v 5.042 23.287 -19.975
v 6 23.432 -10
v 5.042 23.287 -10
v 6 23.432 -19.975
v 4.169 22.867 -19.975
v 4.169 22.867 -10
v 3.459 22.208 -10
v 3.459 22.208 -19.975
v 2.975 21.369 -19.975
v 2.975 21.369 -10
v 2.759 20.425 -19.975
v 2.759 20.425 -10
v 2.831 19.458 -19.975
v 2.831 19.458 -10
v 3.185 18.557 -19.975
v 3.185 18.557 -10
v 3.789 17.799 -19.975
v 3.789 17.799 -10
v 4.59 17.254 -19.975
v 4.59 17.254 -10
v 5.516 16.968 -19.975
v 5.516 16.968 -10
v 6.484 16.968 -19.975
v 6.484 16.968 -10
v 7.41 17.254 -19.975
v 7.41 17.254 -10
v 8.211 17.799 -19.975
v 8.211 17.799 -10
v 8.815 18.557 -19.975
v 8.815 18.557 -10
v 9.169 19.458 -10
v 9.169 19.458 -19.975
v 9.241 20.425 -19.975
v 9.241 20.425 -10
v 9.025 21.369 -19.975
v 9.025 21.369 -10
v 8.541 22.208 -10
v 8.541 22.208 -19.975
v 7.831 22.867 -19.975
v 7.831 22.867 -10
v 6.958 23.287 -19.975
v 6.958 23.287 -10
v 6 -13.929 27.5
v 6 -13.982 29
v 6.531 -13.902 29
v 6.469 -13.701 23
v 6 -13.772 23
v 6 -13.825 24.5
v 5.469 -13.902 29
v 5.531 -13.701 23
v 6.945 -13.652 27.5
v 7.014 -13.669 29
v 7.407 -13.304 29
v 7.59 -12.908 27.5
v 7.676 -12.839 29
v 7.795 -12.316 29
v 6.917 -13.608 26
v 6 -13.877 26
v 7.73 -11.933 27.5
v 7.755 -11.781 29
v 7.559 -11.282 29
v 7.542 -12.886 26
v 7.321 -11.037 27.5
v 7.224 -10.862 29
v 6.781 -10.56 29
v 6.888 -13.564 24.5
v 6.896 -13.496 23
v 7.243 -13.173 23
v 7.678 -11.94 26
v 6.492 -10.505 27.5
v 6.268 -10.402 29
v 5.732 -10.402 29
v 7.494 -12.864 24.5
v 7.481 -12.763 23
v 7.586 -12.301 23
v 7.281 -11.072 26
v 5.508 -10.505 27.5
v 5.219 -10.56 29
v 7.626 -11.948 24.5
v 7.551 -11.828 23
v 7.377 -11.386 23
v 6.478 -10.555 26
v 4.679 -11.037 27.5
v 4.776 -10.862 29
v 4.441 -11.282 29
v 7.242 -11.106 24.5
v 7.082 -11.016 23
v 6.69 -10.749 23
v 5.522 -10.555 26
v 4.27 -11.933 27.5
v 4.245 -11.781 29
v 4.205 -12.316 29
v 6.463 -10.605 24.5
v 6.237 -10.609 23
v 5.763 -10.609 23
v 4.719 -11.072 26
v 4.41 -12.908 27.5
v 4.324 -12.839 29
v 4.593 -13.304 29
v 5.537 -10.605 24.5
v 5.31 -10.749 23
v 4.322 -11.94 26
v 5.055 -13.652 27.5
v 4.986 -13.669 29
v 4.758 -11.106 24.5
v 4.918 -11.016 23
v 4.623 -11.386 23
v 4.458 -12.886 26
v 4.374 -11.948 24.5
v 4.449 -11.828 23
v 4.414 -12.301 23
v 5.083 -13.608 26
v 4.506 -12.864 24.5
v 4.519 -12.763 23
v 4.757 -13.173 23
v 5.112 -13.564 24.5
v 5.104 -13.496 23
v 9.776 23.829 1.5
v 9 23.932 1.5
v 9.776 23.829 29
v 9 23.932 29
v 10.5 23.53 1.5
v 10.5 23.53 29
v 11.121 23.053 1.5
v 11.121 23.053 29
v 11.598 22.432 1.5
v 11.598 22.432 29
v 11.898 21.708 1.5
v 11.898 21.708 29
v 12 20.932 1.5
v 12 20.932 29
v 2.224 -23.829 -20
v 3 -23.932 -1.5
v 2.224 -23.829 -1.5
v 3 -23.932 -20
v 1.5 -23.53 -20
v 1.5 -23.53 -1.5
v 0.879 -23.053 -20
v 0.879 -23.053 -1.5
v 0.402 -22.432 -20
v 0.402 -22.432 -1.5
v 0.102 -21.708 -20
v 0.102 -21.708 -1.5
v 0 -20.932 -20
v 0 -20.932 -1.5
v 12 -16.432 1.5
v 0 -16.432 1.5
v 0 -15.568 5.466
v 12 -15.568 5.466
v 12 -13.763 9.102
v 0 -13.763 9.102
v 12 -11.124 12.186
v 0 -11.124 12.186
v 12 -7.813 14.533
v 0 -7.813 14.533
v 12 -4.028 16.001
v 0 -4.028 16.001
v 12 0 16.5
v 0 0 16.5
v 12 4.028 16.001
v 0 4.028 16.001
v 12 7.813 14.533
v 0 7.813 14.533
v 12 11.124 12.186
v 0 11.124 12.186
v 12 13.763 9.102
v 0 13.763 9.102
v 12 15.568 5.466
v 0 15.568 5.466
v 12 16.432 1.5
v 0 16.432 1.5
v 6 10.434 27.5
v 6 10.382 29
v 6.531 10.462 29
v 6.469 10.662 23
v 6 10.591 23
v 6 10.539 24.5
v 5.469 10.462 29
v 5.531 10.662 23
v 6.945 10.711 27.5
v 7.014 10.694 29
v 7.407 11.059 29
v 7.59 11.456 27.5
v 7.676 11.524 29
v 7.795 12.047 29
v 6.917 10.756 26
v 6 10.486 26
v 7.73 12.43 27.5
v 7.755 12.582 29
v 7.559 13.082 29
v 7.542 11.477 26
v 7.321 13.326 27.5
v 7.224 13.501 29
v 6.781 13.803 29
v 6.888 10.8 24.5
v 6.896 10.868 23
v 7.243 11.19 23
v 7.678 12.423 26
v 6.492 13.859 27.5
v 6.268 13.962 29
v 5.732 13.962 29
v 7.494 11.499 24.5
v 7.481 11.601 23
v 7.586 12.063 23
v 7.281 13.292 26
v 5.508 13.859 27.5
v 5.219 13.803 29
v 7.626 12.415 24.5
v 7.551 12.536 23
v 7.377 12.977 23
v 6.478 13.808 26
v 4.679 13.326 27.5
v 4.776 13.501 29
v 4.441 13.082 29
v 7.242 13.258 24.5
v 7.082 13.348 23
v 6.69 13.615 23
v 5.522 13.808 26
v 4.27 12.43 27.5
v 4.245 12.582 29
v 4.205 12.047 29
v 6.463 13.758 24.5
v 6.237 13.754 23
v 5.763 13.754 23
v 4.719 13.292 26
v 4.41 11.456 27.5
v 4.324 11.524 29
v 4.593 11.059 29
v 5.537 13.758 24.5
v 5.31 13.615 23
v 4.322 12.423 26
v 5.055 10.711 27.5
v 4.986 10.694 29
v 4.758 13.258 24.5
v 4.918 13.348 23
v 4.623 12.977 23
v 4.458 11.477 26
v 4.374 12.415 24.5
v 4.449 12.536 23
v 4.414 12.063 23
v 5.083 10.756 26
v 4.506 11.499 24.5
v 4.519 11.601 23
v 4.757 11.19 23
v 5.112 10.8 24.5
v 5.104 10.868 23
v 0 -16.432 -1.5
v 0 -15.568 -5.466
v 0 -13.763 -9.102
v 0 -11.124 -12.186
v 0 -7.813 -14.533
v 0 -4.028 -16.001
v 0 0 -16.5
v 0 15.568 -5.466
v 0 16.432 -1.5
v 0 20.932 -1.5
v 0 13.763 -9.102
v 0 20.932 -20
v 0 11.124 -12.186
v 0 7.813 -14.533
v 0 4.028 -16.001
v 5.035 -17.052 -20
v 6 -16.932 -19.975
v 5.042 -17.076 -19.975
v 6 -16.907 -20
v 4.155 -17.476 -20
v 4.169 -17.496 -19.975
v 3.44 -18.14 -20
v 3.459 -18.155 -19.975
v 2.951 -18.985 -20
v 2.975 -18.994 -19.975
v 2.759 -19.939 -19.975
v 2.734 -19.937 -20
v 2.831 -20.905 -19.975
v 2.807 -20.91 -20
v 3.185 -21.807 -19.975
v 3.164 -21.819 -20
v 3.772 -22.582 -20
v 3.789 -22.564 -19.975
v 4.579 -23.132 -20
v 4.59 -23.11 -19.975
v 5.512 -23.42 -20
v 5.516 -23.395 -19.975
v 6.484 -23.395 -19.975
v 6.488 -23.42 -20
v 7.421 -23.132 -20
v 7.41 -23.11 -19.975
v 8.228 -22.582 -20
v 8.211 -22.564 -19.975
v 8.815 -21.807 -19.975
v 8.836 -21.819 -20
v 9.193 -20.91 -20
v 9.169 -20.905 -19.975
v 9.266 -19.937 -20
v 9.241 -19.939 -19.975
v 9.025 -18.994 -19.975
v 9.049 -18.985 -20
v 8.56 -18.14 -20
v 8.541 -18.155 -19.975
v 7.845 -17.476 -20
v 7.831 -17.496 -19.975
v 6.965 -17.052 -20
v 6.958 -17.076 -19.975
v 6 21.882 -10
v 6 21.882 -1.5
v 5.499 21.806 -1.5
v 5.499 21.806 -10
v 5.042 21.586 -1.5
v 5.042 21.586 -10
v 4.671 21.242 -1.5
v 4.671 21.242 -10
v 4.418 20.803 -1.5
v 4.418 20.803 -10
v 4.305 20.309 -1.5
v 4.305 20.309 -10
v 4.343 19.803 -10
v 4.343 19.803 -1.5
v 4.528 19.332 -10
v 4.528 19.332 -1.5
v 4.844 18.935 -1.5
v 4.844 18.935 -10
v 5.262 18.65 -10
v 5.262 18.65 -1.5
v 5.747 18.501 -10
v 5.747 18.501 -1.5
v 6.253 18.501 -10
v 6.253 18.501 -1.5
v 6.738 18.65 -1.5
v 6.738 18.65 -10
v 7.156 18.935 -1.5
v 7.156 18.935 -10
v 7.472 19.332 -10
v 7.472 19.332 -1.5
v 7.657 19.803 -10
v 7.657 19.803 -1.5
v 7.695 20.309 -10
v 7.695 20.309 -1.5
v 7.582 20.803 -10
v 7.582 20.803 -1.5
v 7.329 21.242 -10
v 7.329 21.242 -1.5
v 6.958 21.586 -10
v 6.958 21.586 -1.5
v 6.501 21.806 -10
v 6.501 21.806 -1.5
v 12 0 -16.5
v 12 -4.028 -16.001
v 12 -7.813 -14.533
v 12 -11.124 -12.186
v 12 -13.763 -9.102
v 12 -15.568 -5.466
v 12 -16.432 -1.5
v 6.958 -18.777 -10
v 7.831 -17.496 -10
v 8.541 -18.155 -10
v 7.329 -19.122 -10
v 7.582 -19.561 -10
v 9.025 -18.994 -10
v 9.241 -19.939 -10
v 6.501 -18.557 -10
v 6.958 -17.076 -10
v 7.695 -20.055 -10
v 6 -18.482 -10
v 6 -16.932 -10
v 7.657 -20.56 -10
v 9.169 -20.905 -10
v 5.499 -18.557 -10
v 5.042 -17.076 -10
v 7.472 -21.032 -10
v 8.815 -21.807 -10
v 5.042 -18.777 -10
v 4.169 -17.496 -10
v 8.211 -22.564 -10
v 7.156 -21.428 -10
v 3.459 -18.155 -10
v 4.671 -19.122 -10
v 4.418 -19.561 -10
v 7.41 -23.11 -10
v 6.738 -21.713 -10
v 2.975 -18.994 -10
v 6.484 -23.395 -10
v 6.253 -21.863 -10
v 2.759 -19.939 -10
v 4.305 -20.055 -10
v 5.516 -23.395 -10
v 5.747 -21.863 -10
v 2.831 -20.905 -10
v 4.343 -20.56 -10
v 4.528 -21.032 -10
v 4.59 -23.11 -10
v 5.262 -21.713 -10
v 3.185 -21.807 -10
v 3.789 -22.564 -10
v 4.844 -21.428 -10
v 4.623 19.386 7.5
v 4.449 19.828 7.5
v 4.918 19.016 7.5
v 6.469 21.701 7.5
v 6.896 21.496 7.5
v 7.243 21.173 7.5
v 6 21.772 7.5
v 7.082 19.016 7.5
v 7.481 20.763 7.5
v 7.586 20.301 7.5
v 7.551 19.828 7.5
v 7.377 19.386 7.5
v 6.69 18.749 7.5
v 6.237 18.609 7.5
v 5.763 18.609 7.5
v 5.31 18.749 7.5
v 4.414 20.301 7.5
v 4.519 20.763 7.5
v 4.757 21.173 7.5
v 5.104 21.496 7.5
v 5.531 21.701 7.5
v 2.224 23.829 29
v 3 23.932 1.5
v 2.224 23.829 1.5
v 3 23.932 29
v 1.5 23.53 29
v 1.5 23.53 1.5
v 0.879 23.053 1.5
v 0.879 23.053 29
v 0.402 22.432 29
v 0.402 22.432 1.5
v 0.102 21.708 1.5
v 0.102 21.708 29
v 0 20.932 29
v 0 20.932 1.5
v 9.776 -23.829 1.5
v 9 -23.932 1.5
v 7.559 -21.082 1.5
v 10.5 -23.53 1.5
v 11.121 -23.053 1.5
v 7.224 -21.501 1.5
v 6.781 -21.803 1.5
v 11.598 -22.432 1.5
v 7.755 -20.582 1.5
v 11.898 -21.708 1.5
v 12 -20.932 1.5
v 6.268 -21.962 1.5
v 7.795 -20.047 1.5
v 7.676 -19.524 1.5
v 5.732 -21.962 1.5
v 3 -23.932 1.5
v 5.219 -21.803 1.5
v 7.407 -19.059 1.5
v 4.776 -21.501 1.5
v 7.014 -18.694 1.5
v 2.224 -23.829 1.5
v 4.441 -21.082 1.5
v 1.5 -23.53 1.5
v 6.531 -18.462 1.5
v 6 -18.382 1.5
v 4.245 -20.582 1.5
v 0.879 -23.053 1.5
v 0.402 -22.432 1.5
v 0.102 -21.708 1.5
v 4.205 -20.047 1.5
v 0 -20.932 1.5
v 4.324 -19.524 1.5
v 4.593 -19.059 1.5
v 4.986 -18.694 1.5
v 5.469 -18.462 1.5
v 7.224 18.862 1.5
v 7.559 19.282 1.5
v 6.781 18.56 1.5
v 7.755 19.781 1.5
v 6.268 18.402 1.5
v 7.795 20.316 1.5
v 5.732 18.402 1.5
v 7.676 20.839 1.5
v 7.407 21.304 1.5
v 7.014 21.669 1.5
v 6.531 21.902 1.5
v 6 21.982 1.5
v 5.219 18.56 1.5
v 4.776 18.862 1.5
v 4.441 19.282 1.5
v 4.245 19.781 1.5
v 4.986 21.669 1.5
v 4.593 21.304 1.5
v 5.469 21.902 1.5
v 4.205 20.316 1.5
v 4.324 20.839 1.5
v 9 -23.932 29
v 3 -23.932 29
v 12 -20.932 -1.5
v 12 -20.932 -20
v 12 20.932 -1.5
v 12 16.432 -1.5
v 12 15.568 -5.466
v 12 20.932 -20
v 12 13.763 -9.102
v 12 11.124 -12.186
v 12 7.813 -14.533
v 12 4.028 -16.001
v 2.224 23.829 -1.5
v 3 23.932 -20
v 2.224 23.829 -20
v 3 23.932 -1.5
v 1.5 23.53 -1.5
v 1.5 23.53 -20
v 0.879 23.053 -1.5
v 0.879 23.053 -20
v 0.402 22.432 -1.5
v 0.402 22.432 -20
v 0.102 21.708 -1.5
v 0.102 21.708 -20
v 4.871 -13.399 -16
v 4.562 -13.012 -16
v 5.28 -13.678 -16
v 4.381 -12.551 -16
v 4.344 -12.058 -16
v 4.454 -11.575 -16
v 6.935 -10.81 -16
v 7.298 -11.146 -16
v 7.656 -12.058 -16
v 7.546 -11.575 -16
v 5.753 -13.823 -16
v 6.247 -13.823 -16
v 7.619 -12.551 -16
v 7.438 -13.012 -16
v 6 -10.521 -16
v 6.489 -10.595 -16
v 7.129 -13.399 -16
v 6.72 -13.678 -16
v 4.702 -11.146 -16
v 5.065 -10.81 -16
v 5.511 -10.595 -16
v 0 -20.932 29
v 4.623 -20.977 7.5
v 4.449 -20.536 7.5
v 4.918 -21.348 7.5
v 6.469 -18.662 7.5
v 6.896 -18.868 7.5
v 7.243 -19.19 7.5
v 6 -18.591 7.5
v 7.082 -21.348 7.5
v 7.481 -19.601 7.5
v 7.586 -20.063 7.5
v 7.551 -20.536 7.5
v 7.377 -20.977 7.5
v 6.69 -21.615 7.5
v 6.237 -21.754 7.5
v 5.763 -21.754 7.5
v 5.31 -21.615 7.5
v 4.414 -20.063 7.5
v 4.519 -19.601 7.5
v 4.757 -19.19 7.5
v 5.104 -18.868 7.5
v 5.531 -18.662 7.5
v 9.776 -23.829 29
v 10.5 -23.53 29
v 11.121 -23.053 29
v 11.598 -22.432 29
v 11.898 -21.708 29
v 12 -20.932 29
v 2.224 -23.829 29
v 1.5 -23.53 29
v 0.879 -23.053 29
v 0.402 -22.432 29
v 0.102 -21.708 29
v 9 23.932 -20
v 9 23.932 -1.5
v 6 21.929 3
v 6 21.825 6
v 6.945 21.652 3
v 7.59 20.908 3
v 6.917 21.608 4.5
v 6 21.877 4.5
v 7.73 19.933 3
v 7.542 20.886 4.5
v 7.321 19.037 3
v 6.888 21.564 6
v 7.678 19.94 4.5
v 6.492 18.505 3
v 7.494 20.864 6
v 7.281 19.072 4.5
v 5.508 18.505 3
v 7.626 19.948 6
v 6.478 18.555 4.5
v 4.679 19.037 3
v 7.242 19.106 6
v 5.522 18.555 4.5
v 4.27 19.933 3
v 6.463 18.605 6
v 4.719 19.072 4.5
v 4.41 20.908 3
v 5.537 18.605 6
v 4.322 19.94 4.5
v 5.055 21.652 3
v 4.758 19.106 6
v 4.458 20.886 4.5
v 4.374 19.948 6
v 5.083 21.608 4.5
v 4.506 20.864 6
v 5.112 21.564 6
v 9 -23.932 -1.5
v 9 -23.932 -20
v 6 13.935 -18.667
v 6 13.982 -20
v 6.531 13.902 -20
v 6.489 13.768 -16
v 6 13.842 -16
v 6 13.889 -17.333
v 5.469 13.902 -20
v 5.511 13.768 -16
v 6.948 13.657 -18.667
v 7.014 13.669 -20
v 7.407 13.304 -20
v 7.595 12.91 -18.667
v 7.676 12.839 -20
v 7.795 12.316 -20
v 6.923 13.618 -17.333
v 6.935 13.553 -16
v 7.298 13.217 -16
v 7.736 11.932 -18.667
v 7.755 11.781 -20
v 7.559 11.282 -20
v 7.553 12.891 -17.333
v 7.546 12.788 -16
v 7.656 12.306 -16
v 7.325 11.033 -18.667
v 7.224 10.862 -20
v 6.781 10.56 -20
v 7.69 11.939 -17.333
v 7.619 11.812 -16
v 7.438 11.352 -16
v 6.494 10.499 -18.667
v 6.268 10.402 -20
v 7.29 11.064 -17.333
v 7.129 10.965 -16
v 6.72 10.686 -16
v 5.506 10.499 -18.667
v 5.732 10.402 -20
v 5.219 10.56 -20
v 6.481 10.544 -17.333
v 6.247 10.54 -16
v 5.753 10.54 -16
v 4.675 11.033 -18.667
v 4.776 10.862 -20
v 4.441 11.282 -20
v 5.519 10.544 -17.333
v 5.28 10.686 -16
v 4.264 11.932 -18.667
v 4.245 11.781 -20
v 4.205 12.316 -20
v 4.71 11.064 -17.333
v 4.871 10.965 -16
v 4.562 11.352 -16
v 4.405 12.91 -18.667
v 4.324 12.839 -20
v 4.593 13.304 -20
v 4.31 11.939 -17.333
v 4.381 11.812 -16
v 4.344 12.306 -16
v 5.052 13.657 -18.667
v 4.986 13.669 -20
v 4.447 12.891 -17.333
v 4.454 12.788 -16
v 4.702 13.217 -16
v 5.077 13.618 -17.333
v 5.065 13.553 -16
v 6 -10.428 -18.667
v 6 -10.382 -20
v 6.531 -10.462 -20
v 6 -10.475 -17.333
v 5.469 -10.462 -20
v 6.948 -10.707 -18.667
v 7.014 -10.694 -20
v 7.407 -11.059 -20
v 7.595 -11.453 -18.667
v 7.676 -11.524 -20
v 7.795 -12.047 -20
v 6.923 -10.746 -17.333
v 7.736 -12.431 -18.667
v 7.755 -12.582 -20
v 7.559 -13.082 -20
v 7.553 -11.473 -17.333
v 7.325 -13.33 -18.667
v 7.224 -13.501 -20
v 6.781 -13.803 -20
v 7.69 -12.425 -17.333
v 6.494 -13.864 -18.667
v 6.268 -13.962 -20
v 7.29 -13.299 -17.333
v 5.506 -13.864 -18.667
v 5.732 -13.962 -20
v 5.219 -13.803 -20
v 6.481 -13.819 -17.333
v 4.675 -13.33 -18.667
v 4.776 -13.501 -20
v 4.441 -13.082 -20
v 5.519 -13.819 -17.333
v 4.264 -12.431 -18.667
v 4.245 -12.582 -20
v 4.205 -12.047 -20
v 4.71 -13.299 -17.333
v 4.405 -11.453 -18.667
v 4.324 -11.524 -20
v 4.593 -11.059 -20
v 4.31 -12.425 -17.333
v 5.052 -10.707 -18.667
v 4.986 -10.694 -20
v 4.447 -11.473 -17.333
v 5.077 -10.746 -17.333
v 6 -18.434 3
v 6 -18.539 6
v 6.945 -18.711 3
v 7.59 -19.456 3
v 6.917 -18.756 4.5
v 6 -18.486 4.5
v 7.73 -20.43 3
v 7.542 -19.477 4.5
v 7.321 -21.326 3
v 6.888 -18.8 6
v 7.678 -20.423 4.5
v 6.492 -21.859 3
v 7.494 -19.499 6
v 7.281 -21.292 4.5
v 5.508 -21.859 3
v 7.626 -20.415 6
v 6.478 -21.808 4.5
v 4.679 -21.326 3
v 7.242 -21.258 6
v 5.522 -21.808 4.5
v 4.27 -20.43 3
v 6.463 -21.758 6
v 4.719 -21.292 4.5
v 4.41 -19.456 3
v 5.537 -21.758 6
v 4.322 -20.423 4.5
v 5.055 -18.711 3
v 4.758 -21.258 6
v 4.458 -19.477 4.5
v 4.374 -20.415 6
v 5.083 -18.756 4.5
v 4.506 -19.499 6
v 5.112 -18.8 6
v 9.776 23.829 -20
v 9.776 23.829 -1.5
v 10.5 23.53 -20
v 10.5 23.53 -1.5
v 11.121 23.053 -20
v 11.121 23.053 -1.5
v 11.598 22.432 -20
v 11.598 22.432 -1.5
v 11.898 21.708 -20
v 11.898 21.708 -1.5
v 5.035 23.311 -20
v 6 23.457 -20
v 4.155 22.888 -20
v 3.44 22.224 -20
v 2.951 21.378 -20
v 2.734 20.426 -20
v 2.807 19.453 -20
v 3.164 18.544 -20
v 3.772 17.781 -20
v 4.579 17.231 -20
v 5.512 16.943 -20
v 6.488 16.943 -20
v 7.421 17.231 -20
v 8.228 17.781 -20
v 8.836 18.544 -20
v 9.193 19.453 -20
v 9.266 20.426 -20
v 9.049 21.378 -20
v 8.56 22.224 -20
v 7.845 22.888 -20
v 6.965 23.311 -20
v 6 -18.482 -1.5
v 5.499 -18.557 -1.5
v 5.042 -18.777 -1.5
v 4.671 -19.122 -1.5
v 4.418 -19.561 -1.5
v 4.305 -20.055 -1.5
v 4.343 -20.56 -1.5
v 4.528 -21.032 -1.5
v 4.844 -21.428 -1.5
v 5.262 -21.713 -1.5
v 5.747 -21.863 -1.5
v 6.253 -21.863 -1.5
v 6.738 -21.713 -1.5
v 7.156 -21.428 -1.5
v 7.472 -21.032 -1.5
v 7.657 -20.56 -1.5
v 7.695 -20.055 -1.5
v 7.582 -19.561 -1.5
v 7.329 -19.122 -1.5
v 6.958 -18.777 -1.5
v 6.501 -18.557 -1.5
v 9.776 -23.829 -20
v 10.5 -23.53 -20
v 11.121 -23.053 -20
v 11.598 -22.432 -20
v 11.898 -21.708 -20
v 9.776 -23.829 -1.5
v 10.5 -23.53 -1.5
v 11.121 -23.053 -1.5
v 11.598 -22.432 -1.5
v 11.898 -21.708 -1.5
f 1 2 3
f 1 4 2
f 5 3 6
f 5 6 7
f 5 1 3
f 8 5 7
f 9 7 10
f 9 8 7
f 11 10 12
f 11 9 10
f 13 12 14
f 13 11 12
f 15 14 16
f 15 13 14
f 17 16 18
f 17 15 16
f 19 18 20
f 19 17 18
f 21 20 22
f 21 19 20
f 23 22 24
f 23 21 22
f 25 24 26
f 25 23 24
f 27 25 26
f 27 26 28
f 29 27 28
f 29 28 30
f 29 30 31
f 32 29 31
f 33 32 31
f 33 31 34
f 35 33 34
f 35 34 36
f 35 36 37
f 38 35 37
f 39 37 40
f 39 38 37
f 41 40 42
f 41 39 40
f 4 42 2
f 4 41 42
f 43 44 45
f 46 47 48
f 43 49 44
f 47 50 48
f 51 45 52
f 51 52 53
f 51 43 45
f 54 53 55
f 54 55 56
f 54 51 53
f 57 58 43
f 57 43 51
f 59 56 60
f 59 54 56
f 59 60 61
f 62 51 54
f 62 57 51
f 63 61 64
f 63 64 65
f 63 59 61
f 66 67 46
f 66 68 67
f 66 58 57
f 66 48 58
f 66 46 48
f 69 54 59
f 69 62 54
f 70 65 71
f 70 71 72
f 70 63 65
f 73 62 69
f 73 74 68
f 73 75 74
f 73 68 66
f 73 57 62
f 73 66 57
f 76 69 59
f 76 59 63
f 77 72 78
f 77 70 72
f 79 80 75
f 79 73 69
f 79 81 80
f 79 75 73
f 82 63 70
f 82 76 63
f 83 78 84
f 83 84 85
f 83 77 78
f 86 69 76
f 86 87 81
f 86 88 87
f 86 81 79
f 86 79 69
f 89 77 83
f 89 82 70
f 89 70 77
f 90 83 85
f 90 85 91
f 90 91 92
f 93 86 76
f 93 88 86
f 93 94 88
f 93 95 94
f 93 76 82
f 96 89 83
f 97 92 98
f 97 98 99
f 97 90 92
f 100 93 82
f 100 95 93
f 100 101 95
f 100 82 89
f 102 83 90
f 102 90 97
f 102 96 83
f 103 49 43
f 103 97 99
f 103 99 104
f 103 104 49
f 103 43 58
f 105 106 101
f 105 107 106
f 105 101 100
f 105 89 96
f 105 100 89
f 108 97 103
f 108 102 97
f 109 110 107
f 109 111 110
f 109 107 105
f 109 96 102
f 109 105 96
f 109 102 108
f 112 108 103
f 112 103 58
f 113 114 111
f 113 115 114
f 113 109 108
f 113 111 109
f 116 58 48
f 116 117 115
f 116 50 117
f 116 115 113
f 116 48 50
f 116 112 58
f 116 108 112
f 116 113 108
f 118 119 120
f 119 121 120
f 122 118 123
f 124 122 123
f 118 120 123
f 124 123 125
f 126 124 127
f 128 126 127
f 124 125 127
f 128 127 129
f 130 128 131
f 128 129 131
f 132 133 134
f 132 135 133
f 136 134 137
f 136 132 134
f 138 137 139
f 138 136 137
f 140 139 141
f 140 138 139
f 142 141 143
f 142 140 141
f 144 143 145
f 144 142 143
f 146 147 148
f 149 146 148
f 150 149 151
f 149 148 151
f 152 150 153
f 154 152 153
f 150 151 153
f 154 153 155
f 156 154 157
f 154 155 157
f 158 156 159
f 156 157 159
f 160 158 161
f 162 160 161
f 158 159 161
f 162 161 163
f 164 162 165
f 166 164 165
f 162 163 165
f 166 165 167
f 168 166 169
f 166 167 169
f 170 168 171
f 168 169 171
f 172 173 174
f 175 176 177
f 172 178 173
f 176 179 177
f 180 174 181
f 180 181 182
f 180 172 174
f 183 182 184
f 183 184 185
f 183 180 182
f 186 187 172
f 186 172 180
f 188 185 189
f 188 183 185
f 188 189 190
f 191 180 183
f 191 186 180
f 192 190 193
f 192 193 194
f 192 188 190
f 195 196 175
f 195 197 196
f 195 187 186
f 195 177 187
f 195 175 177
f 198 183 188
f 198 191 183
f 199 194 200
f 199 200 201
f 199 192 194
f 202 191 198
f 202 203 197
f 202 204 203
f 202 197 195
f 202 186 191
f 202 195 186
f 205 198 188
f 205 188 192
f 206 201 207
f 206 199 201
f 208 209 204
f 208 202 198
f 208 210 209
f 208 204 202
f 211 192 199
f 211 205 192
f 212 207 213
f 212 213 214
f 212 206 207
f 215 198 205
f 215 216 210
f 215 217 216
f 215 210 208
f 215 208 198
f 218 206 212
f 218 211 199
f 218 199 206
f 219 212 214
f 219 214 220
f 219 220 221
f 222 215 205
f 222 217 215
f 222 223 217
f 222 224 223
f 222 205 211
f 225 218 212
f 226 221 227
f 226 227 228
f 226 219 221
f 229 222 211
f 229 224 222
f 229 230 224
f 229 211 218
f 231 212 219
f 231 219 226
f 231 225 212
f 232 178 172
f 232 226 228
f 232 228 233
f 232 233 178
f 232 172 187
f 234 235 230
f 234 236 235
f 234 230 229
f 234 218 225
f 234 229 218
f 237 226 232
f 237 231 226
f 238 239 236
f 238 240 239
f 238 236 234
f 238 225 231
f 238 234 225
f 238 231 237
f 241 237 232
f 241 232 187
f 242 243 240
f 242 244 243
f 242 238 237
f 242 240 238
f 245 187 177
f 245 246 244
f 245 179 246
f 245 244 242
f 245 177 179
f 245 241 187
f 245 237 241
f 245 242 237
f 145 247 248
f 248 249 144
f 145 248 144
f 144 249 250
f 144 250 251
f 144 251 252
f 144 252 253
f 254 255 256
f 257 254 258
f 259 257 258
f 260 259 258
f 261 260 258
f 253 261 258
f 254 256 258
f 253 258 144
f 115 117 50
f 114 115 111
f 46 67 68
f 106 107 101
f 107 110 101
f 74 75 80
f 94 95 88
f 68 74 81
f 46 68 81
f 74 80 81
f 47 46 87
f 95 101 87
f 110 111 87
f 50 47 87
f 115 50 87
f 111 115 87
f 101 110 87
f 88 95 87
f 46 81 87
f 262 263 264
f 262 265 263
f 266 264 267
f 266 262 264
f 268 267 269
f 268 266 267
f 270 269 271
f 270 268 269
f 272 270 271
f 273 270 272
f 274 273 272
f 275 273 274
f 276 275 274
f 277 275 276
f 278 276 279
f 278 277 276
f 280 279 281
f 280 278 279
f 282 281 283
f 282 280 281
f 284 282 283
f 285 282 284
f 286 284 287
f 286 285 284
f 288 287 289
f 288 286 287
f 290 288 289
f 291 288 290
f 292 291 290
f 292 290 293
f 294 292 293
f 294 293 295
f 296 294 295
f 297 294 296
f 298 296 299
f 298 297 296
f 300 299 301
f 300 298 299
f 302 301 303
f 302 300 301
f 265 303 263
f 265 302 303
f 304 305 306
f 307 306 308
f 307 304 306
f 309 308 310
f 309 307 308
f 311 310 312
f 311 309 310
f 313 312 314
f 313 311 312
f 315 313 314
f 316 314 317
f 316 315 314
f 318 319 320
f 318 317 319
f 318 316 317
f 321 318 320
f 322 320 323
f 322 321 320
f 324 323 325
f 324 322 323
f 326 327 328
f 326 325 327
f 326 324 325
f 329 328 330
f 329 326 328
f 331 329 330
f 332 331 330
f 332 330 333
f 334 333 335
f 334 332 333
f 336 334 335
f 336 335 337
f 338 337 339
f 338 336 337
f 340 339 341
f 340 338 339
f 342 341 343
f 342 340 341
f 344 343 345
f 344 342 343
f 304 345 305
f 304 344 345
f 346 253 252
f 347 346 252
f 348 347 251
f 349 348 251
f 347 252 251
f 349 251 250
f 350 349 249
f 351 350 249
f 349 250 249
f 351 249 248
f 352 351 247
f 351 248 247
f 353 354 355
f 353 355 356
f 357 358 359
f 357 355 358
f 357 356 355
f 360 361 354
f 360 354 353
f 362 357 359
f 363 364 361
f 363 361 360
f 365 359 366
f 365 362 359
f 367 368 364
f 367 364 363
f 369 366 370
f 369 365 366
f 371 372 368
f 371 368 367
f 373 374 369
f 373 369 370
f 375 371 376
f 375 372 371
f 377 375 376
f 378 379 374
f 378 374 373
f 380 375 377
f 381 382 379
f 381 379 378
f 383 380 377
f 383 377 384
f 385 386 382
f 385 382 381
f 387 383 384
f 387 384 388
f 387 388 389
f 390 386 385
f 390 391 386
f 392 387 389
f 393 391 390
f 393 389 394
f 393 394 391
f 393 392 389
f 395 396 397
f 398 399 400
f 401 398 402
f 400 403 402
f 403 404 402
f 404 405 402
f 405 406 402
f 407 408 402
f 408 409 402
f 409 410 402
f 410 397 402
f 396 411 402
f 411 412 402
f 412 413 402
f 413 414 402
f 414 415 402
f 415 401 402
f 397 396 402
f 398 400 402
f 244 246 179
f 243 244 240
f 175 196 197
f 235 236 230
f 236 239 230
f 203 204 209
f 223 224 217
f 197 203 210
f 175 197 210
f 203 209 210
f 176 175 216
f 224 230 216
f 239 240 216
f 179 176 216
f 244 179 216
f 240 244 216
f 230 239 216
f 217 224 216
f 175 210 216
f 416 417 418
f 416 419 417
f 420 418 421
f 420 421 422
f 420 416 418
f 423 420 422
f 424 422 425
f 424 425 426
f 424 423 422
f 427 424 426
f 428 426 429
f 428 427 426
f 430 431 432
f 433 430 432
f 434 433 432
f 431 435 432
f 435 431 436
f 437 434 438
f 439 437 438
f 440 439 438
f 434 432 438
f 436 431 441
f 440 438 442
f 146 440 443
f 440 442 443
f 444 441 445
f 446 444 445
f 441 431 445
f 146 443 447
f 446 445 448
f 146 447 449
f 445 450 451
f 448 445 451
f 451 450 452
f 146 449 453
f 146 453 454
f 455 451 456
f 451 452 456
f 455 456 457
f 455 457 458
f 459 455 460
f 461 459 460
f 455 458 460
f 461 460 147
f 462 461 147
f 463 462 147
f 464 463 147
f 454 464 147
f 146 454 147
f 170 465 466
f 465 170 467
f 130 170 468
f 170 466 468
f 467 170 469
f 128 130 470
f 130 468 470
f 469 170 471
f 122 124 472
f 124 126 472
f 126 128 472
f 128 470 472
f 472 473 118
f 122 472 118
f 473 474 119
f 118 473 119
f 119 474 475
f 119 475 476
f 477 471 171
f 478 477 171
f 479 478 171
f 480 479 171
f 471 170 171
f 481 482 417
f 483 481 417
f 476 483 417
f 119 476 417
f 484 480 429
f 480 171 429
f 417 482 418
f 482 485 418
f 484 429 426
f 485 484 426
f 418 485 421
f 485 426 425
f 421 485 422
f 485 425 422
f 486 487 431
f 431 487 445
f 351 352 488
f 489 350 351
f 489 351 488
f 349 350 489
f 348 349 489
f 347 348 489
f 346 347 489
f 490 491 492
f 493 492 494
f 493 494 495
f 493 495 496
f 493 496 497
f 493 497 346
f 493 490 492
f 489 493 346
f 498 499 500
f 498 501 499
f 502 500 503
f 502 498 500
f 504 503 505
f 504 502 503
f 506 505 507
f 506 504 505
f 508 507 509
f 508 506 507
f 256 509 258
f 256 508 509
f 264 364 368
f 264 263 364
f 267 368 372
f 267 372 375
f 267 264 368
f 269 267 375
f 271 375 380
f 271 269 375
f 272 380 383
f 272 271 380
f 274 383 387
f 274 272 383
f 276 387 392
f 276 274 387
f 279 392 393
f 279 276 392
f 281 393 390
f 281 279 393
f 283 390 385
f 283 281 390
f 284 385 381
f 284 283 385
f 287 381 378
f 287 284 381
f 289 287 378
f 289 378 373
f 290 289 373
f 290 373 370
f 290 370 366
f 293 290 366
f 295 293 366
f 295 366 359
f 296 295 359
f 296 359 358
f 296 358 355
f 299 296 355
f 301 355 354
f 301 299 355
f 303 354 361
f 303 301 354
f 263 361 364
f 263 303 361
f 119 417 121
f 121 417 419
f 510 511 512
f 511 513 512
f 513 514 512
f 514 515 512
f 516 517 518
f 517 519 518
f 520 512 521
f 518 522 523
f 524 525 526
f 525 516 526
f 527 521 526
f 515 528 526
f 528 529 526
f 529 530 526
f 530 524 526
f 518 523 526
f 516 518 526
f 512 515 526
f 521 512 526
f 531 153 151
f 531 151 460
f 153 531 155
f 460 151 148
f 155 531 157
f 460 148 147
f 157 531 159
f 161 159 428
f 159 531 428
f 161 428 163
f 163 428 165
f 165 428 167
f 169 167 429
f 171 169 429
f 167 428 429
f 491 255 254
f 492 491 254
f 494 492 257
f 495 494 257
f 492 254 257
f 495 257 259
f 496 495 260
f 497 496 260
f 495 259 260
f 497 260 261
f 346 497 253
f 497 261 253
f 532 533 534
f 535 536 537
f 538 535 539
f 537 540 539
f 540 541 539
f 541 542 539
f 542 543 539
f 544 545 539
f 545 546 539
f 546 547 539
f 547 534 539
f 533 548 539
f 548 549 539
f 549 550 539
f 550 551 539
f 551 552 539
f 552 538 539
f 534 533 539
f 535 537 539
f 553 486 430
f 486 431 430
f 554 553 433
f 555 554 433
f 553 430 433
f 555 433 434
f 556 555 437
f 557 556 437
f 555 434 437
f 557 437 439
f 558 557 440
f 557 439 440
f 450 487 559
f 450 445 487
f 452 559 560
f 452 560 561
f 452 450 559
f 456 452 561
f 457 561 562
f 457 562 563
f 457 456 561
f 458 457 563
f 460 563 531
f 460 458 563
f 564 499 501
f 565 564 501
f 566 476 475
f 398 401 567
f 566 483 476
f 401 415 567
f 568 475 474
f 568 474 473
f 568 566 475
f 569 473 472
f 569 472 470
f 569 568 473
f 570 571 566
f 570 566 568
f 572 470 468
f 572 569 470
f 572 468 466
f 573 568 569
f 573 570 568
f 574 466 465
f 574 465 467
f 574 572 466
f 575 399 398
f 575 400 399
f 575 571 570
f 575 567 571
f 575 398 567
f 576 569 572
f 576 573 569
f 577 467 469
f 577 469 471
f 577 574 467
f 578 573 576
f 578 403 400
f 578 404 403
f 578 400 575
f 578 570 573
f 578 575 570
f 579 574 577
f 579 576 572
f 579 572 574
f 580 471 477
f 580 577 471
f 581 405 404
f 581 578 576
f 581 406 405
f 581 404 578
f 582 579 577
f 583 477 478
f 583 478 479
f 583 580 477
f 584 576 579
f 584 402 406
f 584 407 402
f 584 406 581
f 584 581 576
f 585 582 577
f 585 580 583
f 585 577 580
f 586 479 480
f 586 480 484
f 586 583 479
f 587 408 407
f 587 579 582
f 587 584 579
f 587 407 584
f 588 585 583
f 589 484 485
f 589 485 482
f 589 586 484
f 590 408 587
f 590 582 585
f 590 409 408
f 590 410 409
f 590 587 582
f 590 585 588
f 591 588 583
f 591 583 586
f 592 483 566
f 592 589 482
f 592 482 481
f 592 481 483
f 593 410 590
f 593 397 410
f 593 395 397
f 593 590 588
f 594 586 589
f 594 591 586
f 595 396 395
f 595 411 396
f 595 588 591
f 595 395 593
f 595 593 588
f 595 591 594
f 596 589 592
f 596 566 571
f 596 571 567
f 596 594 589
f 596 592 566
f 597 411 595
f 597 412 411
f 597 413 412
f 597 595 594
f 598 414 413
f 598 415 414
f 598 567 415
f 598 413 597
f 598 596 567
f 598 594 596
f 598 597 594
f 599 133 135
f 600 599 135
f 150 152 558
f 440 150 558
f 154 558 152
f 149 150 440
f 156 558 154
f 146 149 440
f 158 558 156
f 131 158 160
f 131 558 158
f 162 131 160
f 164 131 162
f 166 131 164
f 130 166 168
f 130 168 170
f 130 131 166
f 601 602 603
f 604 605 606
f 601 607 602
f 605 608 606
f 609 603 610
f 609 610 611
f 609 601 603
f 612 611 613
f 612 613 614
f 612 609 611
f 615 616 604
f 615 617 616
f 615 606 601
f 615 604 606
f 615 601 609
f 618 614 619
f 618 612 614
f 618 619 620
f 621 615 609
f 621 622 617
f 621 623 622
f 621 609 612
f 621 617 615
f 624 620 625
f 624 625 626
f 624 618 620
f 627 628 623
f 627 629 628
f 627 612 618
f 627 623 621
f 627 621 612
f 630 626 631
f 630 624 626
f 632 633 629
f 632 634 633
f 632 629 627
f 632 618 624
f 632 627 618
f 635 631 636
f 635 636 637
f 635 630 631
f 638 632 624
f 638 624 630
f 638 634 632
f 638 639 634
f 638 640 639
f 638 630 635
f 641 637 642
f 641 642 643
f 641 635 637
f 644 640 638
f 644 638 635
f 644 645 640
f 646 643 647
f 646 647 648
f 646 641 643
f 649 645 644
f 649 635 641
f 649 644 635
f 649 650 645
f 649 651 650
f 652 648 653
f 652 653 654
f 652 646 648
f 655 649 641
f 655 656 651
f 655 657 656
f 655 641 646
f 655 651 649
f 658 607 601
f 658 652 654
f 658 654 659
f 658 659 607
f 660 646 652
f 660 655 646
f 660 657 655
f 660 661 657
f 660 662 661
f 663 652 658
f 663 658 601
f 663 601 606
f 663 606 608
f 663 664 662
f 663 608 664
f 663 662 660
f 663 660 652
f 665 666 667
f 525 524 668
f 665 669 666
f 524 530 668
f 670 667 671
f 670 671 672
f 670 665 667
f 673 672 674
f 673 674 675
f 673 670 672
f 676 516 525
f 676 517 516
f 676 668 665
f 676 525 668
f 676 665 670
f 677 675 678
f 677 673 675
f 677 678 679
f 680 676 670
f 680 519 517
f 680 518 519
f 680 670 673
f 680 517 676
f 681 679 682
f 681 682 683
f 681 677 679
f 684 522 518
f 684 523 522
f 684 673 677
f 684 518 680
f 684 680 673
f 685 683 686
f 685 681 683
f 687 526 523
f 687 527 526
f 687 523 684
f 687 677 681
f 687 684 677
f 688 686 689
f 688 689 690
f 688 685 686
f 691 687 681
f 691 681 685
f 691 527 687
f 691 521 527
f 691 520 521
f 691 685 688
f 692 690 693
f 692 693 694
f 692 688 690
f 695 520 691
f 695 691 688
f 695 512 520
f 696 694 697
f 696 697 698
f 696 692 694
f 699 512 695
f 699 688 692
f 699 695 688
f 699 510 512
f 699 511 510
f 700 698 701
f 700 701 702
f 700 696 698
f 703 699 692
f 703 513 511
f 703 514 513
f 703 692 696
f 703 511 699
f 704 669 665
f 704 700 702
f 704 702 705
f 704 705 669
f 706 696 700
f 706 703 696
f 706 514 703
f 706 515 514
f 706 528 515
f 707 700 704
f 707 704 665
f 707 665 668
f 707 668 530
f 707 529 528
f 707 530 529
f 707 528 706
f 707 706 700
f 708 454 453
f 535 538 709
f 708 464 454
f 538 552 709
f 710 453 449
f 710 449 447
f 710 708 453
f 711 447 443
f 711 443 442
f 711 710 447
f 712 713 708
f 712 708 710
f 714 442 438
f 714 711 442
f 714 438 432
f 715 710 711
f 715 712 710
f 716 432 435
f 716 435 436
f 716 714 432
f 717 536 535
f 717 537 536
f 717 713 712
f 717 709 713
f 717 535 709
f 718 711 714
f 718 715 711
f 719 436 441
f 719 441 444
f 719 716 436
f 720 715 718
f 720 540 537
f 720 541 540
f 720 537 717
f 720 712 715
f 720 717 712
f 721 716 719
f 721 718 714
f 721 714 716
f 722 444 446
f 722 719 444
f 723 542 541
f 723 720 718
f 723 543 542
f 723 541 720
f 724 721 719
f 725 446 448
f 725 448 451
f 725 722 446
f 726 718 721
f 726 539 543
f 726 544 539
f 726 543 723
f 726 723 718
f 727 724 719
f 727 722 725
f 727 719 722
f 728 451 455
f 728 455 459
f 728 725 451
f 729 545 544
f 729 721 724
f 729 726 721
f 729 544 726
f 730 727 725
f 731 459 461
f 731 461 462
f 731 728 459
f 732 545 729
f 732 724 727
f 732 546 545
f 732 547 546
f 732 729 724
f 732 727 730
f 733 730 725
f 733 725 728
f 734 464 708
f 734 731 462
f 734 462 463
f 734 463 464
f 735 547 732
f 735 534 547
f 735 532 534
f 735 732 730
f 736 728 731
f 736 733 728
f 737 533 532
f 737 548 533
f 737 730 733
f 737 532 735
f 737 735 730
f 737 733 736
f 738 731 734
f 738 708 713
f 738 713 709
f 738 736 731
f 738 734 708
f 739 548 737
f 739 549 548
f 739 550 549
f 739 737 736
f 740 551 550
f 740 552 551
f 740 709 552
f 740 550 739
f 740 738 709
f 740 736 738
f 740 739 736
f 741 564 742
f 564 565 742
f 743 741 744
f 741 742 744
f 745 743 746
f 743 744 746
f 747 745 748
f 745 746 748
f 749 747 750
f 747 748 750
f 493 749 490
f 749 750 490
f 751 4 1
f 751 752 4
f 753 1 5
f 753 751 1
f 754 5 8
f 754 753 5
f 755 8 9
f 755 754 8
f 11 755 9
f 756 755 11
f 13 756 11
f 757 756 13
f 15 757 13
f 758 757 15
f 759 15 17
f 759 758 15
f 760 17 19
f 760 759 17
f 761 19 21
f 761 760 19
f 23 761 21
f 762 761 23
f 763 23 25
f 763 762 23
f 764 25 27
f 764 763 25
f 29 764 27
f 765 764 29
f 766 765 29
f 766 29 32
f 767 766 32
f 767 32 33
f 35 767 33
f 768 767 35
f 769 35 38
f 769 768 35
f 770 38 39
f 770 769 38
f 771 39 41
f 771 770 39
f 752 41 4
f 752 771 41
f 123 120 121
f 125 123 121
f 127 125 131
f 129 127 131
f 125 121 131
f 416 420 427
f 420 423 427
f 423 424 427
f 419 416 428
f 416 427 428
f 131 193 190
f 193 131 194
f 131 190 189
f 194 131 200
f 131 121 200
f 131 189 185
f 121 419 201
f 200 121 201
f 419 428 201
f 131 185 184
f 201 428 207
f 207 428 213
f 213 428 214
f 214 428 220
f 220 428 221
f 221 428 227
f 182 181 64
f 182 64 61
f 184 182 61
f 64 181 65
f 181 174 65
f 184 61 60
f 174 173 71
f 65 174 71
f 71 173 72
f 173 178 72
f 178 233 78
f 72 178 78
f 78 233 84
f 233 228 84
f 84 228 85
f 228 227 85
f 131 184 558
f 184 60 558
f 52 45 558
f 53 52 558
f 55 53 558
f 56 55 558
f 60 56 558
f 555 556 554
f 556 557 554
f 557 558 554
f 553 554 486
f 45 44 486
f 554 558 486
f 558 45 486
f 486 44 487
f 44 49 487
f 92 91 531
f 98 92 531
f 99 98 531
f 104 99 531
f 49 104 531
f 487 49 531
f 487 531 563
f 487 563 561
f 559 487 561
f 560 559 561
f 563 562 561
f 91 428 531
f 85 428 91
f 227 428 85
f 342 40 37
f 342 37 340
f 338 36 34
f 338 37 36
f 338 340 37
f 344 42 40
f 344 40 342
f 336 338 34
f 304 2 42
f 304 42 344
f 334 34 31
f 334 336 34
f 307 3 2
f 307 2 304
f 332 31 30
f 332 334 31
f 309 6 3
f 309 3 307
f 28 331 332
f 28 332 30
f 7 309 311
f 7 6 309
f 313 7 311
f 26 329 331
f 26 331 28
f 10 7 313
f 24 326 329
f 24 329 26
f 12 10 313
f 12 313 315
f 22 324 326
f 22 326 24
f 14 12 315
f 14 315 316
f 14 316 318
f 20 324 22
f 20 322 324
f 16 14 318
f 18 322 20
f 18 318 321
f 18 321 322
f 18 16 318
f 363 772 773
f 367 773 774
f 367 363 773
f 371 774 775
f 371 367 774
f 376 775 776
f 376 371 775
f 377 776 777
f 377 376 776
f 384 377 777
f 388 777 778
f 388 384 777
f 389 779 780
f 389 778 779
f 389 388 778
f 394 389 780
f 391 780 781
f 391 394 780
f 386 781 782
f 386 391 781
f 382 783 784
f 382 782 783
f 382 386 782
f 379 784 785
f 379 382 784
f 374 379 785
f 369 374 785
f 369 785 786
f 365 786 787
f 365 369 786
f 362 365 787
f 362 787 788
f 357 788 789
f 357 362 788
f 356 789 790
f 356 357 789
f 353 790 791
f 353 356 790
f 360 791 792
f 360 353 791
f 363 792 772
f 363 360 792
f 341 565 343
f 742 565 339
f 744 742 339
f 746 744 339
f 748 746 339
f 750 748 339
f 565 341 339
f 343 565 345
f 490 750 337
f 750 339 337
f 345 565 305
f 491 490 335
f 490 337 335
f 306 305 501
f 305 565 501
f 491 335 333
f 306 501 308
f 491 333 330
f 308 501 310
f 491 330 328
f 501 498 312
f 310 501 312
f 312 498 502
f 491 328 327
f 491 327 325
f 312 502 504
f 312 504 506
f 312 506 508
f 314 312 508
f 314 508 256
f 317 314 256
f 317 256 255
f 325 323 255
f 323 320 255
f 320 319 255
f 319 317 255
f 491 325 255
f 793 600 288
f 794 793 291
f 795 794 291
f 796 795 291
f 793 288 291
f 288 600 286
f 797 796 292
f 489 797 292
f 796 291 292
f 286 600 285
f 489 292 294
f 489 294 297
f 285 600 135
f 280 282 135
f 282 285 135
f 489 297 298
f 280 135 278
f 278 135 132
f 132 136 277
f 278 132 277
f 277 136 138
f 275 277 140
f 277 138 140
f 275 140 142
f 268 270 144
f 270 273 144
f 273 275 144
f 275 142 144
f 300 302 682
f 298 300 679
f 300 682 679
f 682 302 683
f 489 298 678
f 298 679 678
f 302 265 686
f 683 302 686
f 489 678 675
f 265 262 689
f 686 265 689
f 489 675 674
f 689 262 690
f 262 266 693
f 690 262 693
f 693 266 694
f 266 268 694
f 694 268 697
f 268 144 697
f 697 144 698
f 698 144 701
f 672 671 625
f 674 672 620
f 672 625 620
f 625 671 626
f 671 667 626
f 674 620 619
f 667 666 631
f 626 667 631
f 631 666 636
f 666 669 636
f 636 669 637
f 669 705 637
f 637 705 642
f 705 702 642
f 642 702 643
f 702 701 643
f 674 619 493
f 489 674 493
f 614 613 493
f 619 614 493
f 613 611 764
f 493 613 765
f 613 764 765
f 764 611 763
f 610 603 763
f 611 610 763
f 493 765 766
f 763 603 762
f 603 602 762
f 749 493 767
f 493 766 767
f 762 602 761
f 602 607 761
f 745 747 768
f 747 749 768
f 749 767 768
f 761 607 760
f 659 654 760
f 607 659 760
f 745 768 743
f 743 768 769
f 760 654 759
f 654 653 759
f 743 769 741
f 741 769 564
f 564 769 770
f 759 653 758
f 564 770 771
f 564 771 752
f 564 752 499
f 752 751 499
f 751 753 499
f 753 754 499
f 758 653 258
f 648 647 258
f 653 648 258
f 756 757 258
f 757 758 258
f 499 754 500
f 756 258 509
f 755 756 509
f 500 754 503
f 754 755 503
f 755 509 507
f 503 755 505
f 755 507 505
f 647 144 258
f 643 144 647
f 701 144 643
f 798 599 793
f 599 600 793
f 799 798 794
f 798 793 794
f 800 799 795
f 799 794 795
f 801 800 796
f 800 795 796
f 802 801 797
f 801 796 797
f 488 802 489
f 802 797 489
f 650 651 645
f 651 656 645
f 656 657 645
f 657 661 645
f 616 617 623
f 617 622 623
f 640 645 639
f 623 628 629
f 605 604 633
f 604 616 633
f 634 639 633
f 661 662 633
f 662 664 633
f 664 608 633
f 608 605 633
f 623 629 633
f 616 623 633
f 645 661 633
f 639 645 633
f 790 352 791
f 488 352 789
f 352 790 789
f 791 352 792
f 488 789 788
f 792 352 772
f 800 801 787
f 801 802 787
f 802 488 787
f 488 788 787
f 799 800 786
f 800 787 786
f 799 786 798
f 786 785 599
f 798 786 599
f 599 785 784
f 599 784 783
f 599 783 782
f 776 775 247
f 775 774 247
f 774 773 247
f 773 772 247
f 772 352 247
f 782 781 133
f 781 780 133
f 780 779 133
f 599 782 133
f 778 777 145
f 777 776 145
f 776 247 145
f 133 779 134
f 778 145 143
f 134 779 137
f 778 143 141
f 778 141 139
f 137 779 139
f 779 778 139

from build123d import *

# Parameters (mm, degrees)
BOSS_EXTRUDE1_DEPTH           = 12
BOSS_EXTRUDE1_2_DEPTH         = 12
FILLET1_R                     = 3
FILLET2_R                     = 3
CBORE_FOR_M3_SHCS1_AT_2_COUNT = 2
CBORE_FOR_M3_SHCS1_AT_2_PITCH = 40.36335345
SKETCH8_W                     = 1.8
SKETCH8_H                     = 6
HOLE1_AT_2_COUNT              = 2
HOLE1_AT_2_PITCH              = 40.36335345
SKETCH10_W                    = 1.8
SKETCH10_H                    = 4
HOLE2_AT_2_COUNT              = 2
HOLE2_AT_2_PITCH              = 24.36335345
SKETCH14_W                    = 1.8
SKETCH14_H                    = 6
HOLE3_AT_2_COUNT              = 2
HOLE3_AT_2_PITCH              = 24.36335345
DRAFT1_ANGLE                  = 2
DRAFT2_ANGLE                  = 2
DRAFT3_ANGLE                  = 2


with BuildPart() as part:
    # Sketch1 → Boss-Extrude1 (new body)
    with BuildSketch(Plane(origin=(0, 0, 0), x_dir=(0, 0, -1), z_dir=(1, 0, 0))):
        with BuildLine():
            Line((1.5, 23.931676725), (1.5, 16.431676725))
            ThreePointArc((1.5, 16.431676725), (12.186057607, 11.124297731), (16.5, 0))
            ThreePointArc((16.5, 0), (12.186057607, -11.124297731), (1.5, -16.431676725))
            Line((1.5, -16.431676725), (1.5, -23.931676725))
            Line((1.5, -23.931676725), (20, -23.931676725))
            Line((20, -23.931676725), (20, 23.931676725))
            Line((20, 23.931676725), (1.5, 23.931676725))
        make_face()
    extrude(amount=BOSS_EXTRUDE1_DEPTH)

    # Fillet1
    fillet1_edges = [part.edges().sort_by_distance(p)[0] for p in [
        (12, -23.931676725, -10.75),
        (12, 23.931676725, -10.75),
        (0, 23.931676725, -10.75),
        (0, -23.931676725, -10.75),
    ]]
    fillet(fillet1_edges, radius=FILLET1_R)

    # Sketch6 → CBORE for M3 SHCS1 (revolve, cut)
    with BuildSketch(Plane(origin=(6, 20.181676725, -20), x_dir=(0, 1, 0), z_dir=(1, 0, 0))):
        Polygon((0, 0), (0, 49), (1.7, 49), (1.7, 10), (3.25, 10), (3.25, 0.025), (3.275, 0), align=None)
    cbore_for_m3_shcs1 = revolve(axis=Axis((6, 20.181676725, -26.35), (0, 0, 1)), mode=Mode.SUBTRACT)

    # CBORE for M3 SHCS1 at 2: CBORE for M3 SHCS1 ×2
    with Locations(*[(0, -i * CBORE_FOR_M3_SHCS1_AT_2_PITCH, 0) for i in range(1, CBORE_FOR_M3_SHCS1_AT_2_COUNT)]):
        add(cbore_for_m3_shcs1, mode=Mode.SUBTRACT)

    # Sketch10 → Hole2 (revolve, cut)
    with BuildSketch(Plane(origin=(6, 12.181676725, -20), x_dir=(0, 1, 0), z_dir=(1, 0, 0))):
        with Locations((0.9, 2)):
            Rectangle(SKETCH10_W, SKETCH10_H)
    hole2 = revolve(axis=Axis((6, 12.181676725, 90), (0, 0, -1)), mode=Mode.SUBTRACT)

    # Hole2 at 2: Hole2 ×2
    with Locations(*[(0, -i * HOLE2_AT_2_PITCH, 0) for i in range(1, HOLE2_AT_2_COUNT)]):
        add(hole2, mode=Mode.SUBTRACT)

    # Draft1
    draft1_faces = [part.faces().sort_by_distance(p)[0] for p in [
        (6, -13.981676725, -18),
        (6, 10.381676725, -18),
    ]]
    draft(draft1_faces, Plane(origin=(12, 0, -20), x_dir=(-1, 0, 0), z_dir=(0, 0, -1)), DRAFT1_ANGLE)


with BuildPart() as body_2:
    # Sketch1 → Boss-Extrude1 2 (new body)
    with BuildSketch(Plane(origin=(0, 0, 0), x_dir=(0, 0, -1), z_dir=(1, 0, 0))):
        with BuildLine():
            ThreePointArc((-1.5, -16.431676725), (-16.5, 0), (-1.5, 16.431676725))
            Line((-1.5, 16.431676725), (-1.5, 23.931676725))
            Line((-1.5, 23.931676725), (-29, 23.931676725))
            Line((-29, 23.931676725), (-29, -23.931676725))
            Line((-29, -23.931676725), (-1.5, -23.931676725))
            Line((-1.5, -23.931676725), (-1.5, -16.431676725))
        make_face()
    extrude(amount=BOSS_EXTRUDE1_2_DEPTH)

    # Fillet2
    fillet2_edges = [body_2.edges().sort_by_distance(p)[0] for p in [
        (12, 23.931676725, 15.25),
        (12, -23.931676725, 15.25),
        (0, -23.931676725, 15.25),
        (0, 23.931676725, 15.25),
    ]]
    fillet(fillet2_edges, radius=FILLET2_R)

    # Sketch8 → Hole1 (revolve, cut)
    with BuildSketch(Plane(origin=(6, 20.181676725, 1.5), x_dir=(0, 1, 0), z_dir=(1, 0, 0))):
        with Locations((0.9, 3)):
            Rectangle(SKETCH8_W, SKETCH8_H)
    hole1 = revolve(axis=Axis((6, 20.181676725, 111.5), (0, 0, -1)), mode=Mode.SUBTRACT)

    # Hole1 at 2: Hole1 ×2
    with Locations(*[(0, -i * HOLE1_AT_2_PITCH, 0) for i in range(1, HOLE1_AT_2_COUNT)]):
        add(hole1, mode=Mode.SUBTRACT)

    # Sketch14 → Hole3 (revolve, cut)
    with BuildSketch(Plane(origin=(6, 12.181676725, 29), x_dir=(0, -1, 0), z_dir=(1, 0, 0))):
        with Locations((0.9, 3)):
            Rectangle(SKETCH14_W, SKETCH14_H)
    hole3 = revolve(axis=Axis((6, 12.181676725, -81), (0, 0, 1)), mode=Mode.SUBTRACT)

    # Hole3 at 2: Hole3 ×2
    with Locations(*[(0, -i * HOLE3_AT_2_PITCH, 0) for i in range(1, HOLE3_AT_2_COUNT)]):
        add(hole3, mode=Mode.SUBTRACT)

    # Draft2
    draft2_faces = [body_2.faces().sort_by_distance(p)[0] for p in [
        (6, -21.981676725, 4.5),
        (6, 18.381676725, 4.5),
    ]]
    draft(draft2_faces, Plane(origin=(12, 0, 1.5), x_dir=(0, -1, 0), z_dir=(0, 0, -1)), DRAFT2_ANGLE)

    # Draft3
    draft3_faces = [body_2.faces().sort_by_distance(p)[0] for p in [
        (6, -10.381676725, 26),
        (6, 13.981676725, 26),
    ]]
    draft(draft3_faces, Plane(origin=(12, 0, 29), x_dir=(1, 0, 0), z_dir=(0, 0, 1)), DRAFT3_ANGLE)


solid = Compound([part.part, body_2.part])
